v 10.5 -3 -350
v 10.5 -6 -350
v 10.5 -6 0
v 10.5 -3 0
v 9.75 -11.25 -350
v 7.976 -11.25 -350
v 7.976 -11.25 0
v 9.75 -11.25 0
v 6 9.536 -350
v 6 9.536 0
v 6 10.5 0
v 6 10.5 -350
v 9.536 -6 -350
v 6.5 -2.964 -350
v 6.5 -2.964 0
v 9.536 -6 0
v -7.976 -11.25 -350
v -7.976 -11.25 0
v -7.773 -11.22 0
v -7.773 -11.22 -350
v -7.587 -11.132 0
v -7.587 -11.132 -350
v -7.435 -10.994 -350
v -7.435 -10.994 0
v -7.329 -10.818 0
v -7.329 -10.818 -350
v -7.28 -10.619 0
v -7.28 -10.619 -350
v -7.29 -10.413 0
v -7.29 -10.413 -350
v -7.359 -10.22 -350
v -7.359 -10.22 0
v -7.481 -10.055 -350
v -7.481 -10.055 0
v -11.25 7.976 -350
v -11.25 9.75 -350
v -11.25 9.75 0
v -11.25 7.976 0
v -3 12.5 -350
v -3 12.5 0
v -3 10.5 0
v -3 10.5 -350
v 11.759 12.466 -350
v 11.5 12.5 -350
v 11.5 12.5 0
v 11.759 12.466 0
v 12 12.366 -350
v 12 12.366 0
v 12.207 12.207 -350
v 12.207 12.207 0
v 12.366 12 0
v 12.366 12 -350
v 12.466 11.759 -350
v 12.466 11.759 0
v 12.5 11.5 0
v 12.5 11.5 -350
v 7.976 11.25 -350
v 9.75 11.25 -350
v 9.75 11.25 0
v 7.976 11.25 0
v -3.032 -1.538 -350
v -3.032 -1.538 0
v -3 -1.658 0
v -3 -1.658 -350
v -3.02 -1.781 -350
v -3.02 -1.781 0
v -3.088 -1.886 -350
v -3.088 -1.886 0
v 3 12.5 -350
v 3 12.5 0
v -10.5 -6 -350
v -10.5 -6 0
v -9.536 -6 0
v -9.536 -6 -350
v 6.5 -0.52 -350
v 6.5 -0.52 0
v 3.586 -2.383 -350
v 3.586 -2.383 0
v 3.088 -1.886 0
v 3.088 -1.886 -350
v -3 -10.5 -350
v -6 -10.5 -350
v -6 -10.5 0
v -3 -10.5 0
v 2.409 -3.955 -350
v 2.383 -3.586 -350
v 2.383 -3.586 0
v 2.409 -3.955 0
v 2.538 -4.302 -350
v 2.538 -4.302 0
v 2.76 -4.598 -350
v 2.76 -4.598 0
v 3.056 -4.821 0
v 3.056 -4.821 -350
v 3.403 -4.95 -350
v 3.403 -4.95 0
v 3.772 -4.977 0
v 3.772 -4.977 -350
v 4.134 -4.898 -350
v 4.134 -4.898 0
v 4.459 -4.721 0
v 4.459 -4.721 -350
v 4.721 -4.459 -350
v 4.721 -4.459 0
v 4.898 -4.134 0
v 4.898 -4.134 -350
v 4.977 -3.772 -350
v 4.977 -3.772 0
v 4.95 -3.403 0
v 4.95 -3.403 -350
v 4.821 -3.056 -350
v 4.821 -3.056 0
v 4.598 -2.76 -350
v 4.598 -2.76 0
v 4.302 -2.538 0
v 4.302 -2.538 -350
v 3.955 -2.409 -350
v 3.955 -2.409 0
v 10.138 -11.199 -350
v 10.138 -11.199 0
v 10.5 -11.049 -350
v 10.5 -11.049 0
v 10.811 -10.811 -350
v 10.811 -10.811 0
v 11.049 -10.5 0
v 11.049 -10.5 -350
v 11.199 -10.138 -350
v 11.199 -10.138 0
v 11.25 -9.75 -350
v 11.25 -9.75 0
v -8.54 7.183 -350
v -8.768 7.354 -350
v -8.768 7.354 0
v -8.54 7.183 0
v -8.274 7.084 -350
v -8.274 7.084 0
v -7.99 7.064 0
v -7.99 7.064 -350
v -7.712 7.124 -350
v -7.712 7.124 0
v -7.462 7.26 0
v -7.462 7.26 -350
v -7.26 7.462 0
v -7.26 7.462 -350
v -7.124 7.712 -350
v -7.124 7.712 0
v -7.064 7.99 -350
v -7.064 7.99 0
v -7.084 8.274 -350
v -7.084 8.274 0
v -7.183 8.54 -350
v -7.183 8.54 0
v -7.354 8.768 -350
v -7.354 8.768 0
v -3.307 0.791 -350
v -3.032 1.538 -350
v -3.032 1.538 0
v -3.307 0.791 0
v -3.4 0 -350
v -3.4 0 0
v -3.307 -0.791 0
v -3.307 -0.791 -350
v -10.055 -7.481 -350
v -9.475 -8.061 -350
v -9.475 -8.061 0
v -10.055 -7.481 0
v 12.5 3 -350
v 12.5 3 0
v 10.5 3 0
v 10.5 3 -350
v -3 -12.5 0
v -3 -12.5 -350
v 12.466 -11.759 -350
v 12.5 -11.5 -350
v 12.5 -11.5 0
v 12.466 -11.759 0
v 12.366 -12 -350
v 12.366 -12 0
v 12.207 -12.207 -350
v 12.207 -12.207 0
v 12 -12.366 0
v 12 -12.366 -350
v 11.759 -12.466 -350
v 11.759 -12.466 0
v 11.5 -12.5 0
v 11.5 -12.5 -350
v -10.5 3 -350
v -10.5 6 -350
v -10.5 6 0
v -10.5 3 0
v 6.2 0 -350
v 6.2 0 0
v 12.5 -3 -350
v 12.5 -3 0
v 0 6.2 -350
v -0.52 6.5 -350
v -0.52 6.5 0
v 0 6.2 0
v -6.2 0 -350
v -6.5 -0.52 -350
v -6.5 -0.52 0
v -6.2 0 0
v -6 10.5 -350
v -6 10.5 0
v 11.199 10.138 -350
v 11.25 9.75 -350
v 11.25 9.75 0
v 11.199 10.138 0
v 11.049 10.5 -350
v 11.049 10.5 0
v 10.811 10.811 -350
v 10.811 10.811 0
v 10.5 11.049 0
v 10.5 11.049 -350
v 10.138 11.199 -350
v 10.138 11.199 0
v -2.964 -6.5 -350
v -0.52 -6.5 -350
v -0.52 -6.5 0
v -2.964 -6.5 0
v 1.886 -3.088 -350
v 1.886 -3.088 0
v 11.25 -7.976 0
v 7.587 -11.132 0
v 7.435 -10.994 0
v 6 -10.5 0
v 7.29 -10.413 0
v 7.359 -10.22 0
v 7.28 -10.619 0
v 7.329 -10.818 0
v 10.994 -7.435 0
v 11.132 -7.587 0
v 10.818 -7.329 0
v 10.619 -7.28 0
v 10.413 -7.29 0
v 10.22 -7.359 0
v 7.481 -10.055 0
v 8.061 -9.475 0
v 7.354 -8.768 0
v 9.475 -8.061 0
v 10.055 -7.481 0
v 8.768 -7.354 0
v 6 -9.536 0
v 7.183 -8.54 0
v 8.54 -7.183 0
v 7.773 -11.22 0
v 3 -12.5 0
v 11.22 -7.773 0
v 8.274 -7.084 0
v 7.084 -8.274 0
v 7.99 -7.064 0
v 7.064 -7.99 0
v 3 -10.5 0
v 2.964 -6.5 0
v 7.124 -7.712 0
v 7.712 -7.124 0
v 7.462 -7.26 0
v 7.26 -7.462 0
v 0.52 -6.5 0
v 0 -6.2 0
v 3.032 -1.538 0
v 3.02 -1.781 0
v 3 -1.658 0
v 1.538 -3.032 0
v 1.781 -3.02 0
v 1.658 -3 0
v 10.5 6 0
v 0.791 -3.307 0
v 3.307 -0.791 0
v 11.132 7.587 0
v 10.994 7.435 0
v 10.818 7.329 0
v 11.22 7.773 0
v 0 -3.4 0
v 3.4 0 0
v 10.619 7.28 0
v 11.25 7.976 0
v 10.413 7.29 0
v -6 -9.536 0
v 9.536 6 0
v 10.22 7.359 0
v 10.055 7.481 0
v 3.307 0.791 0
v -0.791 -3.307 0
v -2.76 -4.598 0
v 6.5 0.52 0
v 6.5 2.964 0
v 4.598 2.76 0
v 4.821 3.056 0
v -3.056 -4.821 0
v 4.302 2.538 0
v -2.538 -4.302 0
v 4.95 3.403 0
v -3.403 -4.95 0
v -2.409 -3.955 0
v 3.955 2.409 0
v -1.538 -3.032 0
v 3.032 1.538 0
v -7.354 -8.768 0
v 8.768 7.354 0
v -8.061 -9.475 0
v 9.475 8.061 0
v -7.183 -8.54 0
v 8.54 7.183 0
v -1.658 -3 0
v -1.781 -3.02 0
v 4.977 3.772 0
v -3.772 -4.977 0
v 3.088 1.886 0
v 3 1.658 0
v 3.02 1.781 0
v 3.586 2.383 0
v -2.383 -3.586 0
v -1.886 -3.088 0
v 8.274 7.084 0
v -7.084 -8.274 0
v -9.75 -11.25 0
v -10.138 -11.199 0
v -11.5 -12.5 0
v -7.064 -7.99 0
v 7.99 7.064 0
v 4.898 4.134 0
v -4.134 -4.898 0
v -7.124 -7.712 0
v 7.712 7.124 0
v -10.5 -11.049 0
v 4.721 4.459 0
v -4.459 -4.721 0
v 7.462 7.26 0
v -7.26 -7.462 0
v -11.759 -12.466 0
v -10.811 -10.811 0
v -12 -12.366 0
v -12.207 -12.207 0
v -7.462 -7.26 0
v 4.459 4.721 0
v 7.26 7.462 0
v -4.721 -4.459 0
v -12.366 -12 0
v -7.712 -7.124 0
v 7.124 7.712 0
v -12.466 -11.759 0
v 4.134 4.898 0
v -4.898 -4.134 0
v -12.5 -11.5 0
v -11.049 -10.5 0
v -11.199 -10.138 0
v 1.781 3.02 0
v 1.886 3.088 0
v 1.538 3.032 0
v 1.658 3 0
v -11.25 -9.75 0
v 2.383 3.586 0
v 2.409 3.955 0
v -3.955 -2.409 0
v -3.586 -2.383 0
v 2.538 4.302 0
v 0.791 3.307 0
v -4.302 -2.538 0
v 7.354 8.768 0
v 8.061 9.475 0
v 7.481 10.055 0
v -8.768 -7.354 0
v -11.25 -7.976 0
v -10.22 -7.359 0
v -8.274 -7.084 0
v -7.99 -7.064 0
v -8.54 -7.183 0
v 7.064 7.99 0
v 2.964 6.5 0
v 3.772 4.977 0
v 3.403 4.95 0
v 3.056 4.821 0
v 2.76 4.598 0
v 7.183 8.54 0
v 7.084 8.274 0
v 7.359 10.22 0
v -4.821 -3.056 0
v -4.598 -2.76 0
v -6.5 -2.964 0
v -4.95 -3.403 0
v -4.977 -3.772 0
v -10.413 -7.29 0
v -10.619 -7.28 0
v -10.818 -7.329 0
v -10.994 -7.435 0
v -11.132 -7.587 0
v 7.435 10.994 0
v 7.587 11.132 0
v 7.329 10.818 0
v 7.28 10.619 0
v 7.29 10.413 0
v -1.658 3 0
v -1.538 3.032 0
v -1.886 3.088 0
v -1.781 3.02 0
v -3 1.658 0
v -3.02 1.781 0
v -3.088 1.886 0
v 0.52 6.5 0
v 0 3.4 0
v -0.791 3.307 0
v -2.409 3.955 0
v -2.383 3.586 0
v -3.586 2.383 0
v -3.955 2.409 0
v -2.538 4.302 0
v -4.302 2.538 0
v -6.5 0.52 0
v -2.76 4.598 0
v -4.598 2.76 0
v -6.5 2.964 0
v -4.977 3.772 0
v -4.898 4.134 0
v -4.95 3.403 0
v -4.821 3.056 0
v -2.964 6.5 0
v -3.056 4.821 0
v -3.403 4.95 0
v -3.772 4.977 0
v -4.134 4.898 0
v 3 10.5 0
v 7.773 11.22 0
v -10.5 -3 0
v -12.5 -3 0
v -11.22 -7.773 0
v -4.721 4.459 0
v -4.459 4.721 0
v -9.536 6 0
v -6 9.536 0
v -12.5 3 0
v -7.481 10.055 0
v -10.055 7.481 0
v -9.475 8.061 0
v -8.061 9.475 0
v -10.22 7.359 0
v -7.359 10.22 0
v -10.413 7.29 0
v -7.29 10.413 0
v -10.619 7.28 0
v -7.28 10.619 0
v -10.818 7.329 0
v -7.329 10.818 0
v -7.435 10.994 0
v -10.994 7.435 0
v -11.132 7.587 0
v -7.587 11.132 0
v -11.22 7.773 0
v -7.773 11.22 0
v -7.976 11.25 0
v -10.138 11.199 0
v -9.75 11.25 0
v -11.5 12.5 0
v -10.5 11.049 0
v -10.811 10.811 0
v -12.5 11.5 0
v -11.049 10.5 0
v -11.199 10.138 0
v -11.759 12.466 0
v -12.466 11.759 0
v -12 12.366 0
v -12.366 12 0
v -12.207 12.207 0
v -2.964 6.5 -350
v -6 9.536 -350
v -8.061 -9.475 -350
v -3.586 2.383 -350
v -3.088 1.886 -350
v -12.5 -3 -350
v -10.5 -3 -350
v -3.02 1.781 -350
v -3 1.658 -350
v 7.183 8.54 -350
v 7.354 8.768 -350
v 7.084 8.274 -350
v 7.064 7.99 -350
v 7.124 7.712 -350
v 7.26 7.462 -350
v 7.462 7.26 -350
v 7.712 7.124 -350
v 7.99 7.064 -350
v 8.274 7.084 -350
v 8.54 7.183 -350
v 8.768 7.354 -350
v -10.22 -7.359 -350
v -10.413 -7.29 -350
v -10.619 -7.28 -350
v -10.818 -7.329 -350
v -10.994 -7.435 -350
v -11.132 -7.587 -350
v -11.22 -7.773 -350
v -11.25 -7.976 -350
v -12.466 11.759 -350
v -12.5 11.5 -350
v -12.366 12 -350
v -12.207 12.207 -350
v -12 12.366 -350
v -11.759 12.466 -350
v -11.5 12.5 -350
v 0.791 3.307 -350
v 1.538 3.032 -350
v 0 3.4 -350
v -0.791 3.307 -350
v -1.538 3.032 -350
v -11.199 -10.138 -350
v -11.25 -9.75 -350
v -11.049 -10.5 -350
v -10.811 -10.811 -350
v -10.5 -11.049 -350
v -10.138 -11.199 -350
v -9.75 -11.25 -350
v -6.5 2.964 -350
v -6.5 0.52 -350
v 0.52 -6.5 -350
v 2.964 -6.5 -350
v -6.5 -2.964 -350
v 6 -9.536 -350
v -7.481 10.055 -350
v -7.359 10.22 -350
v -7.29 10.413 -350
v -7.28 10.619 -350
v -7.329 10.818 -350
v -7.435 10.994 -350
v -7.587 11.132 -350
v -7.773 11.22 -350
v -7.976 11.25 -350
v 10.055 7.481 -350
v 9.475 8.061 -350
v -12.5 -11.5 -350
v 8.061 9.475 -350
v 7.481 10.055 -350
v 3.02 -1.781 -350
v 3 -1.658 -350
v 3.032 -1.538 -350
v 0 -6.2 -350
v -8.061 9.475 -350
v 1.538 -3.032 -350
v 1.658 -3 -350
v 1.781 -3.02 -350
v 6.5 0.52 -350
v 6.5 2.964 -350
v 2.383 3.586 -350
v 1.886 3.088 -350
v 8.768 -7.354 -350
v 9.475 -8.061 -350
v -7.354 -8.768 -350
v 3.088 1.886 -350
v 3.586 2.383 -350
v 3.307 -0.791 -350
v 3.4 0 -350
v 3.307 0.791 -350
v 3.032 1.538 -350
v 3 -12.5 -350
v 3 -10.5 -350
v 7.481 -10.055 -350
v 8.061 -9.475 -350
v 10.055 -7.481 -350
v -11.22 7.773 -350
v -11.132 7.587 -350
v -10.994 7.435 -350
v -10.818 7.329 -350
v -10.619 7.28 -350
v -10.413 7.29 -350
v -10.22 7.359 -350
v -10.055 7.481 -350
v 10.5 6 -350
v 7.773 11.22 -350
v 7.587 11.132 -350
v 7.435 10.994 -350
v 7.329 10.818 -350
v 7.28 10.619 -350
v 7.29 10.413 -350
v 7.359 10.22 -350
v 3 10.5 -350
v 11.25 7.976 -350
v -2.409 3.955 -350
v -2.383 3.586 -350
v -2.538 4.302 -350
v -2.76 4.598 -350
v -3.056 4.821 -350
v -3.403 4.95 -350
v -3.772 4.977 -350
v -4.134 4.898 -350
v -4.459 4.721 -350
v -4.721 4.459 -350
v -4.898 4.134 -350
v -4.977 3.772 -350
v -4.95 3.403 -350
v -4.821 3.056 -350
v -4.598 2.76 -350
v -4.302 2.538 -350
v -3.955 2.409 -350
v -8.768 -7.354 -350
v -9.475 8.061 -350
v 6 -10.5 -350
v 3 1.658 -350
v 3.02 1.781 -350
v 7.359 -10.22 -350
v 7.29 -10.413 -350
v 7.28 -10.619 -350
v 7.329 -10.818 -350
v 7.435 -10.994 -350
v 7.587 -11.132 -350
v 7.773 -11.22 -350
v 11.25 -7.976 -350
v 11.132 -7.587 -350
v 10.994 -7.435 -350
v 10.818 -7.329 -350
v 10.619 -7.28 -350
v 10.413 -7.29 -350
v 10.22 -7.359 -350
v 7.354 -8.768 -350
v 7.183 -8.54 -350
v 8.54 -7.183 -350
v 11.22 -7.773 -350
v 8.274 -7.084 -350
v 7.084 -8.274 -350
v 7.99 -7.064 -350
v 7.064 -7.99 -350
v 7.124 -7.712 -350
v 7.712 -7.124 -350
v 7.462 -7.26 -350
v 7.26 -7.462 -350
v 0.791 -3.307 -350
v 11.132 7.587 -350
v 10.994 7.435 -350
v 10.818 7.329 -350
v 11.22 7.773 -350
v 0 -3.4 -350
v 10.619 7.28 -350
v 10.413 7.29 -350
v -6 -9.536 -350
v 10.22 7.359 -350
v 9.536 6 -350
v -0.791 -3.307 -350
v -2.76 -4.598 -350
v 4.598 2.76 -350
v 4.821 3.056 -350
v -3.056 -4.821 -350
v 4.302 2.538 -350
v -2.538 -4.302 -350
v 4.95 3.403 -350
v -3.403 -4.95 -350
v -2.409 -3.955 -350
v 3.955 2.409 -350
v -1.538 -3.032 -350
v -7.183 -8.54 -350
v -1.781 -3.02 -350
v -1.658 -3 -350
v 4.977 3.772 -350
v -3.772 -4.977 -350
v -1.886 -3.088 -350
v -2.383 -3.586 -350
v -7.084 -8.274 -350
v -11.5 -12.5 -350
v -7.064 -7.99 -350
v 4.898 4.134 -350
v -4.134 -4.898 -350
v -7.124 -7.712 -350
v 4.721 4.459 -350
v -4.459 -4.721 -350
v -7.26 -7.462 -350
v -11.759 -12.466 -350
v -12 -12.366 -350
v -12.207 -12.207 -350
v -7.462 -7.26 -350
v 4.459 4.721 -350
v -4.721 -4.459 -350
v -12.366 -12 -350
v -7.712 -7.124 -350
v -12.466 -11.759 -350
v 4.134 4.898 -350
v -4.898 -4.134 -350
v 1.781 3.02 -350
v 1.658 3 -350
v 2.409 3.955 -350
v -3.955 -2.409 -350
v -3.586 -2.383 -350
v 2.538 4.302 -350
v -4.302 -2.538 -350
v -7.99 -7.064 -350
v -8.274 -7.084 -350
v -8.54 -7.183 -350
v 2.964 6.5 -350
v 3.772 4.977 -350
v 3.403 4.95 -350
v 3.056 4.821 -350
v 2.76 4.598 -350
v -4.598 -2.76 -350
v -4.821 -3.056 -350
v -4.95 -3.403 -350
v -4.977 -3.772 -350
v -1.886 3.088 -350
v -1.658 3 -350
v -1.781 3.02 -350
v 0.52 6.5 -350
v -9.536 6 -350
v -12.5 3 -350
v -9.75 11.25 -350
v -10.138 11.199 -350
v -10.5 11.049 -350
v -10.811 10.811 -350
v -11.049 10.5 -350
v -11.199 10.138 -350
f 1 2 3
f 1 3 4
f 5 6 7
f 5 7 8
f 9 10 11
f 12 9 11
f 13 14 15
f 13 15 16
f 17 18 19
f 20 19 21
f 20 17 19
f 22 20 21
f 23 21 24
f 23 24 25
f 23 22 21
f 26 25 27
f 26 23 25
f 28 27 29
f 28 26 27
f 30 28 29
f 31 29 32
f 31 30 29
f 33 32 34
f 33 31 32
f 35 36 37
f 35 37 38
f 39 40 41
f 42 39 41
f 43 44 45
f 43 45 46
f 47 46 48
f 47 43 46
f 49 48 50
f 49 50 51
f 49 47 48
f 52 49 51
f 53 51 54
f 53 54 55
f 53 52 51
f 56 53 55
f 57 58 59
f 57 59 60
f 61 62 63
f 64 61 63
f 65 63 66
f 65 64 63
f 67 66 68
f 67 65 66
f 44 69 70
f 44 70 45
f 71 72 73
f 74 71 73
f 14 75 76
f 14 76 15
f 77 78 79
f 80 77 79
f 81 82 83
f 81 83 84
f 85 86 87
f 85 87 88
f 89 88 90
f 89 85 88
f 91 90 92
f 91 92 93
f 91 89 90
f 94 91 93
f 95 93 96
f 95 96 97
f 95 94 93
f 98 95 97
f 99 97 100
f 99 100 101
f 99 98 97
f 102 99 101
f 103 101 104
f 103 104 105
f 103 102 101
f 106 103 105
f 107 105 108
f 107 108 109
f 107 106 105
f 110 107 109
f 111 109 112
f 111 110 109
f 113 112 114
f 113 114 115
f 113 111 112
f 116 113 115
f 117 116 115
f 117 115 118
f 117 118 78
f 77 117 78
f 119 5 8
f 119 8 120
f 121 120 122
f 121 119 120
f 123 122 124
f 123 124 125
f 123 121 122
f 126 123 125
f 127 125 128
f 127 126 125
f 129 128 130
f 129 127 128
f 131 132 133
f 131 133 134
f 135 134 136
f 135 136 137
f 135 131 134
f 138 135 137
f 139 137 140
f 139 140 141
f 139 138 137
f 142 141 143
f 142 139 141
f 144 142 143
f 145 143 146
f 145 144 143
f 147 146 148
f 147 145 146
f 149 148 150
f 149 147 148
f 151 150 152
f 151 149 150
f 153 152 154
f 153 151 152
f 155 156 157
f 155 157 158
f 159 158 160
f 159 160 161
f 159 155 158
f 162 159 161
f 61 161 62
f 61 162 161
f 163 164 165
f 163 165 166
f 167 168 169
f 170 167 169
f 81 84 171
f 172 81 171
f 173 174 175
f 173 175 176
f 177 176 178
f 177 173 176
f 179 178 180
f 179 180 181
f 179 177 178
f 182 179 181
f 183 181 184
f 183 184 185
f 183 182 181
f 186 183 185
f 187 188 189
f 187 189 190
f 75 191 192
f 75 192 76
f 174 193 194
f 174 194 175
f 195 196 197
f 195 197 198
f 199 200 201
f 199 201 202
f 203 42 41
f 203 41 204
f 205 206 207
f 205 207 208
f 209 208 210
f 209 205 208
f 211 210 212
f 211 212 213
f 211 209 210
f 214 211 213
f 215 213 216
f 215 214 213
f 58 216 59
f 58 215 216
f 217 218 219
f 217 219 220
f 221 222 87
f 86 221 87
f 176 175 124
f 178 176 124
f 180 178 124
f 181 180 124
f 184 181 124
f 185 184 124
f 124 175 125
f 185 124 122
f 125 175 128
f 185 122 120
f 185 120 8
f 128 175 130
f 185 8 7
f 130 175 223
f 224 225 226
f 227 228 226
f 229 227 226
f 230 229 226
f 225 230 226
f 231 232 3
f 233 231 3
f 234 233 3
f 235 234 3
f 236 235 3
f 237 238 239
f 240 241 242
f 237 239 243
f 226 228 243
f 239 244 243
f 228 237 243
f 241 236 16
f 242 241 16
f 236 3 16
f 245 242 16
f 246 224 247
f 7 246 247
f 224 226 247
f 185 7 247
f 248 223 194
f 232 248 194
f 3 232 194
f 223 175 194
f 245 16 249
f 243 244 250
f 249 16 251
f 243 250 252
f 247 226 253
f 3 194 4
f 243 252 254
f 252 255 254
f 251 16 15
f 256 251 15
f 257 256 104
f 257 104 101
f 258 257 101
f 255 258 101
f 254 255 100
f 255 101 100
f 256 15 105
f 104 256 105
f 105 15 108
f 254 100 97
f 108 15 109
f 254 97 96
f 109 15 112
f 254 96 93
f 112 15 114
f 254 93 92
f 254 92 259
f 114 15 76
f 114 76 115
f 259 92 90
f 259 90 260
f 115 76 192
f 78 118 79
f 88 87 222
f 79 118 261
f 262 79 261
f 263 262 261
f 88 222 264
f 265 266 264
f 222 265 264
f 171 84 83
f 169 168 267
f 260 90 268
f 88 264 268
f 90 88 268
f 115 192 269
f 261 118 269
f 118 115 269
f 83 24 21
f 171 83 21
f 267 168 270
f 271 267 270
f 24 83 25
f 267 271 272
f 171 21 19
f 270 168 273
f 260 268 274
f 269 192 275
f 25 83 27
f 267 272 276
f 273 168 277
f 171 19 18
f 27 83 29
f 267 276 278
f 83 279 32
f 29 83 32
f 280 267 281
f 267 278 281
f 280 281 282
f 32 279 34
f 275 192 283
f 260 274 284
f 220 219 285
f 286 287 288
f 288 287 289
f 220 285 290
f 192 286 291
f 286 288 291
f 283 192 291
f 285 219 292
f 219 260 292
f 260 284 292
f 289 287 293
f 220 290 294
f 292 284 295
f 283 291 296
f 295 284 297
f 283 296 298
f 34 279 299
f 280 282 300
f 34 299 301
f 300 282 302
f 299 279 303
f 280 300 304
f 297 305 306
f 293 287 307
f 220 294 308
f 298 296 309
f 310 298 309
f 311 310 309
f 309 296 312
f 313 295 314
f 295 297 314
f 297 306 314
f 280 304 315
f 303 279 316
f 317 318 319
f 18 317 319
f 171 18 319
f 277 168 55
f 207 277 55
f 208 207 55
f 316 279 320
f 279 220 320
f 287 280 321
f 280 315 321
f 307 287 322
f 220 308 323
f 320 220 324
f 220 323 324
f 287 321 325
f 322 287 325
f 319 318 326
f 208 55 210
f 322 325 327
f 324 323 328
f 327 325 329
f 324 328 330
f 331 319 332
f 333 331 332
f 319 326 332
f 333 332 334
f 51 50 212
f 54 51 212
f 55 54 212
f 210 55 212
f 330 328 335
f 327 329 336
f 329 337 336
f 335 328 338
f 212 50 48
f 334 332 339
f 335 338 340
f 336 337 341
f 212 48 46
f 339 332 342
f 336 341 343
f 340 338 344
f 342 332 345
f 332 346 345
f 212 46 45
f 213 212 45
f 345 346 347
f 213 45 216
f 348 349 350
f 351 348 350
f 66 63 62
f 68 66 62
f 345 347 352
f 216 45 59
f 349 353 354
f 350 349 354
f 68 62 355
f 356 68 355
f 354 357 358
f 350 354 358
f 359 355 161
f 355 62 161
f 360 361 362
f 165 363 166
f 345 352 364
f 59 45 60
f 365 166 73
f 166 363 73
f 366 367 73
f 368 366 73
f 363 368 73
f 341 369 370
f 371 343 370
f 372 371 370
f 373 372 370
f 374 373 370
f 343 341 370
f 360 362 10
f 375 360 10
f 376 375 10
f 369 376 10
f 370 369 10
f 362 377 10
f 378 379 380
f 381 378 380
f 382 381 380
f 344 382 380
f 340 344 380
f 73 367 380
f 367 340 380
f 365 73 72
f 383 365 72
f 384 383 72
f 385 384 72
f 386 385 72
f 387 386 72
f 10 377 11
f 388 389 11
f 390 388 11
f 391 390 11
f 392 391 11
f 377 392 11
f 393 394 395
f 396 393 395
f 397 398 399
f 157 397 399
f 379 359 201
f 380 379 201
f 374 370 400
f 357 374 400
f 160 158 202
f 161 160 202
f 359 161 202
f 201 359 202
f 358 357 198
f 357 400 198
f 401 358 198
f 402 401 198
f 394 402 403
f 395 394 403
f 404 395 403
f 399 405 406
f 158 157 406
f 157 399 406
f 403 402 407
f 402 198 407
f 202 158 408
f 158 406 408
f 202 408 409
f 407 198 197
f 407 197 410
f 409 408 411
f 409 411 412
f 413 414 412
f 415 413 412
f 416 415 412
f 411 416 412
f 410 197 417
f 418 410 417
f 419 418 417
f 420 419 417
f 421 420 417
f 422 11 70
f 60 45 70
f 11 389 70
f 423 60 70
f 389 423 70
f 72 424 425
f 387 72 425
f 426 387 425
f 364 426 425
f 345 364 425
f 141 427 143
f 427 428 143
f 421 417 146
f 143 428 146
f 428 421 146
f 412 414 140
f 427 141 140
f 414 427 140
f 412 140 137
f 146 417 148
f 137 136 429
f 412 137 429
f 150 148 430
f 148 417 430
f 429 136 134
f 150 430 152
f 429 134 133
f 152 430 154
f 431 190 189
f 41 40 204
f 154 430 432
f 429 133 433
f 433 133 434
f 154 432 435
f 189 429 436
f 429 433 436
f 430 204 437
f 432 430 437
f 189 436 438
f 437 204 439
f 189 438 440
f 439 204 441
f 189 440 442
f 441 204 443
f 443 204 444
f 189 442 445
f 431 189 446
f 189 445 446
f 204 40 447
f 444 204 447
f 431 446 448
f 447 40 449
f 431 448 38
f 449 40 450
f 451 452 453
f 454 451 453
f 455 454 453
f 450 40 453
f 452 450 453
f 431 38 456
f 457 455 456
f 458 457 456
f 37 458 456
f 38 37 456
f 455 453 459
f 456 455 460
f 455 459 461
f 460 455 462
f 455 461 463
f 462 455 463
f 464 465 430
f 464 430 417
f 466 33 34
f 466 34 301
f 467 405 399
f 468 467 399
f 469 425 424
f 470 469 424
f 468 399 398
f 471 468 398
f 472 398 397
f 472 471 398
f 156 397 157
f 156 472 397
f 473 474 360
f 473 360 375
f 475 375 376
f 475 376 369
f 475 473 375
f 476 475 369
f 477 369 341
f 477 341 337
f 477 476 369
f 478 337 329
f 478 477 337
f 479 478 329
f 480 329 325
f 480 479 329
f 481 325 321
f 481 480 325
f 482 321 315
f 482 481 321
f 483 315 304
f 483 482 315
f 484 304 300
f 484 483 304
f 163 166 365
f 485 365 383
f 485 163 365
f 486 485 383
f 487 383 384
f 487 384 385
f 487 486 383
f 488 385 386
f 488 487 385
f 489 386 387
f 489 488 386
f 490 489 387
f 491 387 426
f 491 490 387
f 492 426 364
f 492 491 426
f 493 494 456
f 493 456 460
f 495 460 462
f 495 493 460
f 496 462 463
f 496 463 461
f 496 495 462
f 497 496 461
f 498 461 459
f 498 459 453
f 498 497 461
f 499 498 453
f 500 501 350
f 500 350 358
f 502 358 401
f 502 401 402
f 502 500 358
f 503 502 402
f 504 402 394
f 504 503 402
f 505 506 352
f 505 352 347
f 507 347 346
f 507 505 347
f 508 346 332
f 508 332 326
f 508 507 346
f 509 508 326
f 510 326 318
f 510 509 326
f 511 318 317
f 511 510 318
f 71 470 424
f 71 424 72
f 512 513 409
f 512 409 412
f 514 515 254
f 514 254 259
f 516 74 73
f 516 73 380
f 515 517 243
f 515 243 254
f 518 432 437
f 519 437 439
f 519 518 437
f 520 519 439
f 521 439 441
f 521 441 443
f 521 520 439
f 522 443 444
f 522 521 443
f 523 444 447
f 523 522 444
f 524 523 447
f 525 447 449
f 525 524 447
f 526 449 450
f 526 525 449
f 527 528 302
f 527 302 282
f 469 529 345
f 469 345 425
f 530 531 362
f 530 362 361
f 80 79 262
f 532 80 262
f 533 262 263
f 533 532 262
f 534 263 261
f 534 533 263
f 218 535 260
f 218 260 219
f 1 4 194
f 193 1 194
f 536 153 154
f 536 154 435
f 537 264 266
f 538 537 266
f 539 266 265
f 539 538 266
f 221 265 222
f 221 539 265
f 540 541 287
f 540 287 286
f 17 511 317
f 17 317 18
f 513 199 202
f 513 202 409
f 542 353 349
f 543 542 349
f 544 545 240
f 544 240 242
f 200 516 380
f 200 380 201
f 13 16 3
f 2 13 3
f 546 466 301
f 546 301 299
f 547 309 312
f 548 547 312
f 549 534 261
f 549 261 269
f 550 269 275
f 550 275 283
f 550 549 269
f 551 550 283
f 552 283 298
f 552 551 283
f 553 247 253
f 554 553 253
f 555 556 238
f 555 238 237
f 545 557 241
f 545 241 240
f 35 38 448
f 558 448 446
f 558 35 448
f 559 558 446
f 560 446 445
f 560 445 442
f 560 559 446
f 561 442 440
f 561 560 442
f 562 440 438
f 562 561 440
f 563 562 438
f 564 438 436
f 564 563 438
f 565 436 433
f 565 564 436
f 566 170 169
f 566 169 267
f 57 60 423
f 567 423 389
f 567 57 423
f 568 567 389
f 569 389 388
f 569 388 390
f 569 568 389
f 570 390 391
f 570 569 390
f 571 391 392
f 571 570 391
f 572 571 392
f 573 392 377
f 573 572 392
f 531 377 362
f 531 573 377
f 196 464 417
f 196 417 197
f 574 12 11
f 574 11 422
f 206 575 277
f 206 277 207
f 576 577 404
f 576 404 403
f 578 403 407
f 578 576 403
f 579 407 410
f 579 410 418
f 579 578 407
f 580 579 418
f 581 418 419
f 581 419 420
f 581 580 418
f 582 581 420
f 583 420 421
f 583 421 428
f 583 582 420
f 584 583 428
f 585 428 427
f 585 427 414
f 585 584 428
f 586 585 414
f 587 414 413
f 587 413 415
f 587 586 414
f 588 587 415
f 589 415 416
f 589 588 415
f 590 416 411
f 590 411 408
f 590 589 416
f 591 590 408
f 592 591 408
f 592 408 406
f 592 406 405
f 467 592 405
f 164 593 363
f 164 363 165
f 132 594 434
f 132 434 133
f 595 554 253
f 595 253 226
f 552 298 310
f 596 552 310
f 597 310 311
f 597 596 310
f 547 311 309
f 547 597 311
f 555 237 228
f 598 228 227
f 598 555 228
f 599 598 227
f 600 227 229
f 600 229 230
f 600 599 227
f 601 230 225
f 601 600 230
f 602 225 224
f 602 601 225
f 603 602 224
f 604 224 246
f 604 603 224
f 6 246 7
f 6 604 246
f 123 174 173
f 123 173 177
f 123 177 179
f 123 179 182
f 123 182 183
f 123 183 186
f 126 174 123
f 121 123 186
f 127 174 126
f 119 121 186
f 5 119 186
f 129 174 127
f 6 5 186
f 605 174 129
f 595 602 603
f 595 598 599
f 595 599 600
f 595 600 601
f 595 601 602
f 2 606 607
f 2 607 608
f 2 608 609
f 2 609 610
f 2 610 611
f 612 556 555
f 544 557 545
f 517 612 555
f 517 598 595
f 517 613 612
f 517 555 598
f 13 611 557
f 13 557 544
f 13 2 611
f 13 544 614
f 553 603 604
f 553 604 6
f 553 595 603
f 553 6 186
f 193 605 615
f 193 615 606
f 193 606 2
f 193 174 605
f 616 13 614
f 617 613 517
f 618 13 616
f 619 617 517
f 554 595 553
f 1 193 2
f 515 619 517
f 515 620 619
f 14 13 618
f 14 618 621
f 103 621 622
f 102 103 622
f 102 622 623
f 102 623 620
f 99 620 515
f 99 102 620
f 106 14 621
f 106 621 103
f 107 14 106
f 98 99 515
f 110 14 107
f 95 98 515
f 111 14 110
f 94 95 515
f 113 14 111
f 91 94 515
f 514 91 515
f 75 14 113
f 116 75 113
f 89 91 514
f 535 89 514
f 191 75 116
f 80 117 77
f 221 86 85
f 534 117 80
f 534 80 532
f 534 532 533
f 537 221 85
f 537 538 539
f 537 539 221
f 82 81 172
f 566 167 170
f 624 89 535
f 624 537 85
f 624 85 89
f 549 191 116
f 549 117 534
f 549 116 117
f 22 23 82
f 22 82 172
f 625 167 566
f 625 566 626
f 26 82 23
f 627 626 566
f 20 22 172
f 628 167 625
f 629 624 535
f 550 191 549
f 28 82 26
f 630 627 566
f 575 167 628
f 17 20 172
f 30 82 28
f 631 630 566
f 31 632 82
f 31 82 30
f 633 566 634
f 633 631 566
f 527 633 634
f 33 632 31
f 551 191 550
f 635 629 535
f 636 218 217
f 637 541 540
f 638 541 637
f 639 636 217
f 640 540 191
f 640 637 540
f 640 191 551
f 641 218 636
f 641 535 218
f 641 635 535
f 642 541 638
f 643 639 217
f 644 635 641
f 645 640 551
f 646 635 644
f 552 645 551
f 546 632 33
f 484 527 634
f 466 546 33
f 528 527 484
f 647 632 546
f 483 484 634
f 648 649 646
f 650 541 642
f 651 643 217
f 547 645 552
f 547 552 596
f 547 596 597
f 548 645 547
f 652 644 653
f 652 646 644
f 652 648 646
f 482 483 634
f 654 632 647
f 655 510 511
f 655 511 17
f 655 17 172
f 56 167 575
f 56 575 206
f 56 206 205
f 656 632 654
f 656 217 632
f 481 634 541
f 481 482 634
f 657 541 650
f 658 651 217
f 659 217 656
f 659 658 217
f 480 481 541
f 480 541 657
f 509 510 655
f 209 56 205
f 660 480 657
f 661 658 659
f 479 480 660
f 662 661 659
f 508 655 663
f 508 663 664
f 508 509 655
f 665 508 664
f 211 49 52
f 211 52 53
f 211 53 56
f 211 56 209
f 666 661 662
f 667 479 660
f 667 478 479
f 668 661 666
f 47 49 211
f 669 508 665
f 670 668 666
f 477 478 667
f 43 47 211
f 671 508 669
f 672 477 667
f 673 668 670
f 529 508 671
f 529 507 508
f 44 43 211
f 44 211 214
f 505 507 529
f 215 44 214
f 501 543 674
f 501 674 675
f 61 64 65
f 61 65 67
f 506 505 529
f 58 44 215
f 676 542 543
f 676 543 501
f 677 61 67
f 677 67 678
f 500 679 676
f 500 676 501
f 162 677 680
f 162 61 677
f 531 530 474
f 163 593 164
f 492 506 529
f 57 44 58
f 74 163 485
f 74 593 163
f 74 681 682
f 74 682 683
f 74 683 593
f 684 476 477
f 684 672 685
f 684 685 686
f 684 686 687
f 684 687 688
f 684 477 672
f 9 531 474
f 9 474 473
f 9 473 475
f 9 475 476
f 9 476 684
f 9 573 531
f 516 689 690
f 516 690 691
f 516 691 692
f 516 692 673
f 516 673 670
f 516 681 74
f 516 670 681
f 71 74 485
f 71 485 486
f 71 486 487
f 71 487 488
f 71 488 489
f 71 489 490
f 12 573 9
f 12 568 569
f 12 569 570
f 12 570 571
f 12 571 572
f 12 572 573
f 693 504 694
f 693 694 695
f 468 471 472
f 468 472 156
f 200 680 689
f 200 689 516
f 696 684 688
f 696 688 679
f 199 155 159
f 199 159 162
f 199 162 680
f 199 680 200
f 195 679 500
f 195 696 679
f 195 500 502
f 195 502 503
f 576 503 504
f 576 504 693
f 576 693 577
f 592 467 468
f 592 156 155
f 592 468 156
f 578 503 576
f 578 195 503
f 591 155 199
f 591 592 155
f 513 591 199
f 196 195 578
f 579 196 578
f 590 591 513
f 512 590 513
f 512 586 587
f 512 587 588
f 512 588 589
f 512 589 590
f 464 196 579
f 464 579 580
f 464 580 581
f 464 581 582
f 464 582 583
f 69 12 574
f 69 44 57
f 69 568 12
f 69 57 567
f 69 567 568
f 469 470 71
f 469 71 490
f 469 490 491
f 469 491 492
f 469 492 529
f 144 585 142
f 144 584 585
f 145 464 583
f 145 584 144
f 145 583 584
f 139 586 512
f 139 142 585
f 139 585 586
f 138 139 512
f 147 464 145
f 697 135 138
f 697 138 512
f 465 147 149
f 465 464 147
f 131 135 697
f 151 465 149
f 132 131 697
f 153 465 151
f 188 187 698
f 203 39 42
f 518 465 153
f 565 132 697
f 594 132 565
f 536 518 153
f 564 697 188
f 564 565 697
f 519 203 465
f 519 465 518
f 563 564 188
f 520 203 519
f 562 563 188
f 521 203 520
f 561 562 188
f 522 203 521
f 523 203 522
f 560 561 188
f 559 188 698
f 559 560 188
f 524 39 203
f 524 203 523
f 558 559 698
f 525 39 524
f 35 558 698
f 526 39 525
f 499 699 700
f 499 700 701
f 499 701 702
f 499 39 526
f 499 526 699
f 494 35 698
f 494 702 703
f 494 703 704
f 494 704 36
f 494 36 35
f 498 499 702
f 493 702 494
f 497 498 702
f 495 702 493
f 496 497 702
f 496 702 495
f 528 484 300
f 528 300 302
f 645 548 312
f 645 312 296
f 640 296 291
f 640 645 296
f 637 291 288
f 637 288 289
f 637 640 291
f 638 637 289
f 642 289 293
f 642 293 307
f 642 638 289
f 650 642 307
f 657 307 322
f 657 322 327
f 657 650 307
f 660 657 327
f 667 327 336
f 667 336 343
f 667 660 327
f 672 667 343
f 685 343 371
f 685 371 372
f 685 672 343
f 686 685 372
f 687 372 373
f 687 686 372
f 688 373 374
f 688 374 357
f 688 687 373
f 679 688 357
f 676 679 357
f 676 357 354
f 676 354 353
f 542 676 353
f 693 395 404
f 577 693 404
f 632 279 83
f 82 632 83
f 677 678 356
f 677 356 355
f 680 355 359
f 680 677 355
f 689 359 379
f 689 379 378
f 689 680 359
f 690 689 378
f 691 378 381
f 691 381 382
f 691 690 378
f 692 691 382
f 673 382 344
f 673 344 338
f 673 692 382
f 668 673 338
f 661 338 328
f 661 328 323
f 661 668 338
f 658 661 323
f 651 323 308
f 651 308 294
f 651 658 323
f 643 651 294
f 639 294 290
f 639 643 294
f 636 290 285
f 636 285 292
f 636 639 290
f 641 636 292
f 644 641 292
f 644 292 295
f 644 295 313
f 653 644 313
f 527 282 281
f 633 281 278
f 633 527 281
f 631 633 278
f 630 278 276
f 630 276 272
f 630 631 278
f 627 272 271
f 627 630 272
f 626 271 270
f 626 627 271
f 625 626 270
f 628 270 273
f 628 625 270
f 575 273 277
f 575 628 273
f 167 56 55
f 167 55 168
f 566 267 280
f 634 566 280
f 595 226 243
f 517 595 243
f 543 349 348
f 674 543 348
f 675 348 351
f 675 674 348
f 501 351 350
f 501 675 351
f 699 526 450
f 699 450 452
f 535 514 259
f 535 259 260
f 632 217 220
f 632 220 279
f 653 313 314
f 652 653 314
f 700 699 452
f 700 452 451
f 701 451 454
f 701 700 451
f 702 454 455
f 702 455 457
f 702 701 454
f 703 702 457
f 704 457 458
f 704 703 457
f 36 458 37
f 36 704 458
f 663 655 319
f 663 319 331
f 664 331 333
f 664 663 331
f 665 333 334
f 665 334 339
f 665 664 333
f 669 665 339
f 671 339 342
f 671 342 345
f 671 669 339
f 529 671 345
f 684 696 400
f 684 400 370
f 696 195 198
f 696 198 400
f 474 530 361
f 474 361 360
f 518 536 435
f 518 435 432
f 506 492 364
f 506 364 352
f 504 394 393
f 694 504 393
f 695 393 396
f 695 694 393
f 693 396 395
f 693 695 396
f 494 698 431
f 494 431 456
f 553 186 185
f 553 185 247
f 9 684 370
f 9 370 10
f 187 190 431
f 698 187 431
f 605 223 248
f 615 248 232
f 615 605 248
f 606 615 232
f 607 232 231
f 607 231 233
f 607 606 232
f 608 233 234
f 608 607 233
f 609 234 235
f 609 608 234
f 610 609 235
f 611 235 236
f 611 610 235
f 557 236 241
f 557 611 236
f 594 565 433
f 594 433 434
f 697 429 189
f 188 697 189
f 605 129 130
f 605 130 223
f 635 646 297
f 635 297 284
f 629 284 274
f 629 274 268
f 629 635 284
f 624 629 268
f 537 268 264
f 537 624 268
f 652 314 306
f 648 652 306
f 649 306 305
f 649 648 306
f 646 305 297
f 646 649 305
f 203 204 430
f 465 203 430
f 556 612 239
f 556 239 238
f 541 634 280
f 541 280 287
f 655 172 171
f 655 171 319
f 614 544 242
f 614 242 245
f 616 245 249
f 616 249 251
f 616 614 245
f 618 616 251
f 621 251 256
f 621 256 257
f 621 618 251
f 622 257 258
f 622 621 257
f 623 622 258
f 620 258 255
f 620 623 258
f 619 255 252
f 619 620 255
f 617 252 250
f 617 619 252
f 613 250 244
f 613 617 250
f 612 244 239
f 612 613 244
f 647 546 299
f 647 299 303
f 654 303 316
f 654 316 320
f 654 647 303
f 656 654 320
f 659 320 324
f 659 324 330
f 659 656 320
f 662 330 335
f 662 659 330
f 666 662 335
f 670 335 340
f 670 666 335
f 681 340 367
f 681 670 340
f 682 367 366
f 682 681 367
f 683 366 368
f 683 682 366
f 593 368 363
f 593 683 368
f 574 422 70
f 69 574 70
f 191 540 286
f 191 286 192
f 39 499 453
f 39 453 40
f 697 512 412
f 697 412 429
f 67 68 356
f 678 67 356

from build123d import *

# Parameters (mm, degrees)
BOSS_EXTRUDE1_DEPTH = 350


with BuildPart() as part:
    # Sketch1 → Boss-Extrude1 (new body)
    with BuildSketch(Plane(origin=(0, 0, -350), x_dir=(-1, 0, 0), z_dir=(0, 0, -1))):
        with BuildLine():
            Line((12.5, -3), (10.5, -3))
            Line((10.5, -3), (10.5, -6))
            Line((10.5, -6), (9.535533906, -6))
            Line((9.535533906, -6), (6.5, -2.964466094))
            Line((6.5, -2.964466094), (6.5, -0.519615242))
            Line((6.5, -0.519615242), (6.2, 0))
            Line((6.2, 0), (6.5, 0.519615242))
            Line((6.5, 0.519615242), (6.5, 2.964466094))
            Line((6.5, 2.964466094), (9.535533906, 6))
            Line((9.535533906, 6), (10.5, 6))
            Line((10.5, 6), (10.5, 3))
            Line((10.5, 3), (12.5, 3))
            Line((12.5, 3), (12.5, 11.5))
            ThreePointArc((12.5, 11.5), (12.207106781, 12.207106781), (11.5, 12.5))
            Line((11.5, 12.5), (3, 12.5))
            Line((3, 12.5), (3, 10.5))
            Line((3, 10.5), (6, 10.5))
            Line((6, 10.5), (6, 9.535533906))
            Line((6, 9.535533906), (2.964466094, 6.5))
            Line((2.964466094, 6.5), (0.519615242, 6.5))
            Line((0.519615242, 6.5), (0, 6.2))
            Line((0, 6.2), (-0.519615242, 6.5))
            Line((-0.519615242, 6.5), (-2.964466094, 6.5))
            Line((-2.964466094, 6.5), (-6, 9.535533906))
            Line((-6, 9.535533906), (-6, 10.5))
            Line((-6, 10.5), (-3, 10.5))
            Line((-3, 10.5), (-3, 12.5))
            Line((-3, 12.5), (-11.5, 12.5))
            ThreePointArc((-11.5, 12.5), (-12.207106781, 12.207106781), (-12.5, 11.5))
            Line((-12.5, 11.5), (-12.5, 3))
            Line((-12.5, 3), (-10.5, 3))
            Line((-10.5, 3), (-10.5, 6))
            Line((-10.5, 6), (-9.535533906, 6))
            Line((-9.535533906, 6), (-6.5, 2.964466094))
            Line((-6.5, 2.964466094), (-6.5, 0.519615242))
            Line((-6.5, 0.519615242), (-6.2, 0))
            Line((-6.2, 0), (-6.5, -0.519615242))
            Line((-6.5, -0.519615242), (-6.5, -2.964466094))
            Line((-6.5, -2.964466094), (-9.535533906, -6))
            Line((-9.535533906, -6), (-10.5, -6))
            Line((-10.5, -6), (-10.5, -3))
            Line((-10.5, -3), (-12.5, -3))
            Line((-12.5, -3), (-12.5, -11.5))
            ThreePointArc((-12.5, -11.5), (-12.207106781, -12.207106781), (-11.5, -12.5))
            Line((-11.5, -12.5), (-3, -12.5))
            Line((-3, -12.5), (-3, -10.5))
            Line((-3, -10.5), (-6, -10.5))
            Line((-6, -10.5), (-6, -9.535533906))
            Line((-6, -9.535533906), (-2.964466094, -6.5))
            Line((-2.964466094, -6.5), (-0.519615242, -6.5))
            Line((-0.519615242, -6.5), (0, -6.2))
            Line((0, -6.2), (0.519615242, -6.5))
            Line((0.519615242, -6.5), (2.964466094, -6.5))
            Line((2.964466094, -6.5), (6, -9.535533906))
            Line((6, -9.535533906), (6, -10.5))
            Line((6, -10.5), (3, -10.5))
            Line((3, -10.5), (3, -12.5))
            Line((3, -12.5), (11.5, -12.5))
            ThreePointArc((11.5, -12.5), (12.207106781, -12.207106781), (12.5, -11.5))
            Line((12.5, -11.5), (12.5, -3))
        make_face()
        with BuildLine():
            Line((3.087755464, -1.885673936), (3.585519377, -2.383437849))
            ThreePointArc((3.585519377, -2.383437849), (4.599238816, -4.599238816), (2.383437849, -3.585519377))
            Line((2.383437849, -3.585519377), (1.885673936, -3.087755464))
            ThreePointArc((1.885673936, -3.087755464), (1.720751743, -3.0036254), (1.537849315, -3.032329053))
            ThreePointArc((1.537849315, -3.032329053), (0, -3.4), (-1.537849315, -3.032329053))
            ThreePointArc((-1.537849315, -3.032329053), (-1.720751743, -3.0036254), (-1.885673936, -3.087755464))
            Line((-1.885673936, -3.087755464), (-2.383437849, -3.585519377))
            ThreePointArc((-2.383437849, -3.585519377), (-4.599238816, -4.599238816), (-3.585519377, -2.383437849))
            Line((-3.585519377, -2.383437849), (-3.087755464, -1.885673936))
            ThreePointArc((-3.087755464, -1.885673936), (-3.0036254, -1.720751743), (-3.032329053, -1.537849315))
            ThreePointArc((-3.032329053, -1.537849315), (-3.4, 0), (-3.032329053, 1.537849315))
            ThreePointArc((-3.032329053, 1.537849315), (-3.0036254, 1.720751743), (-3.087755464, 1.885673936))
            Line((-3.087755464, 1.885673936), (-3.585519377, 2.383437849))
            ThreePointArc((-3.585519377, 2.383437849), (-4.599238816, 4.599238816), (-2.383437849, 3.585519377))
            Line((-2.383437849, 3.585519377), (-1.885673936, 3.087755464))
            ThreePointArc((-1.885673936, 3.087755464), (-1.720751743, 3.0036254), (-1.537849315, 3.032329053))
            ThreePointArc((-1.537849315, 3.032329053), (0, 3.4), (1.537849315, 3.032329053))
            ThreePointArc((1.537849315, 3.032329053), (1.720751743, 3.0036254), (1.885673936, 3.087755464))
            Line((1.885673936, 3.087755464), (2.383437849, 3.585519377))
            ThreePointArc((2.383437849, 3.585519377), (4.599238816, 4.599238816), (3.585519377, 2.383437849))
            Line((3.585519377, 2.383437849), (3.087755464, 1.885673936))
            ThreePointArc((3.087755464, 1.885673936), (3.0036254, 1.720751743), (3.032329053, 1.537849315))
            ThreePointArc((3.032329053, 1.537849315), (3.4, 0), (3.032329053, -1.537849315))
            ThreePointArc((3.032329053, -1.537849315), (3.0036254, -1.720751743), (3.087755464, -1.885673936))
        make_face(mode=Mode.SUBTRACT)
        with BuildLine():
            Line((11.25, -7.976197667), (11.25, -9.75))
            ThreePointArc((11.25, -9.75), (10.810660172, -10.810660172), (9.75, -11.25))
            Line((9.75, -11.25), (7.976197667, -11.25))
            ThreePointArc((7.976197667, -11.25), (7.329481994, -10.817878403), (7.48122292, -10.055025253))
            Line((7.48122292, -10.055025253), (8.061017306, -9.475230868))
            Line((8.061017306, -9.475230868), (7.353910524, -8.768124087))
            ThreePointArc((7.353910524, -8.768124087), (7.353910524, -7.353910524), (8.768124087, -7.353910524))
            Line((8.768124087, -7.353910524), (9.475230868, -8.061017306))
            Line((9.475230868, -8.061017306), (10.055025253, -7.48122292))
            ThreePointArc((10.055025253, -7.48122292), (10.817878403, -7.329481994), (11.25, -7.976197667))
        make_face(mode=Mode.SUBTRACT)
        with BuildLine():
            Line((-8.061017306, 9.475230868), (-7.353910524, 8.768124087))
            ThreePointArc((-7.353910524, 8.768124087), (-7.353910524, 7.353910524), (-8.768124087, 7.353910524))
            Line((-8.768124087, 7.353910524), (-9.475230868, 8.061017306))
            Line((-9.475230868, 8.061017306), (-10.055025253, 7.48122292))
            ThreePointArc((-10.055025253, 7.48122292), (-10.817878403, 7.329481994), (-11.25, 7.976197667))
            Line((-11.25, 7.976197667), (-11.25, 9.75))
            ThreePointArc((-11.25, 9.75), (-10.810660172, 10.810660172), (-9.75, 11.25))
            Line((-9.75, 11.25), (-7.976197667, 11.25))
            ThreePointArc((-7.976197667, 11.25), (-7.329481994, 10.817878403), (-7.48122292, 10.055025253))
            Line((-7.48122292, 10.055025253), (-8.061017306, 9.475230868))
        make_face(mode=Mode.SUBTRACT)
        with BuildLine():
            Line((-9.475230868, -8.061017306), (-8.768124087, -7.353910524))
            ThreePointArc((-8.768124087, -7.353910524), (-7.353910524, -7.353910524), (-7.353910524, -8.768124087))
            Line((-7.353910524, -8.768124087), (-8.061017306, -9.475230868))
            Line((-8.061017306, -9.475230868), (-7.48122292, -10.055025253))
            ThreePointArc((-7.48122292, -10.055025253), (-7.329481994, -10.817878403), (-7.976197667, -11.25))
            Line((-7.976197667, -11.25), (-9.75, -11.25))
            ThreePointArc((-9.75, -11.25), (-10.810660172, -10.810660172), (-11.25, -9.75))
            Line((-11.25, -9.75), (-11.25, -7.976197667))
            ThreePointArc((-11.25, -7.976197667), (-10.817878403, -7.329481994), (-10.055025253, -7.48122292))
            Line((-10.055025253, -7.48122292), (-9.475230868, -8.061017306))
        make_face(mode=Mode.SUBTRACT)
        with BuildLine():
            Line((11.25, 9.75), (11.25, 7.976197667))
            ThreePointArc((11.25, 7.976197667), (10.817878403, 7.329481994), (10.055025253, 7.48122292))
            Line((10.055025253, 7.48122292), (9.475230868, 8.061017306))
            Line((9.475230868, 8.061017306), (8.768124087, 7.353910524))
            ThreePointArc((8.768124087, 7.353910524), (7.353910524, 7.353910524), (7.353910524, 8.768124087))
            Line((7.353910524, 8.768124087), (8.061017306, 9.475230868))
            Line((8.061017306, 9.475230868), (7.48122292, 10.055025253))
            ThreePointArc((7.48122292, 10.055025253), (7.329481994, 10.817878403), (7.976197667, 11.25))
            Line((7.976197667, 11.25), (9.75, 11.25))
            ThreePointArc((9.75, 11.25), (10.810660172, 10.810660172), (11.25, 9.75))
        make_face(mode=Mode.SUBTRACT)
    extrude(amount=-BOSS_EXTRUDE1_DEPTH)


solid = part.part
